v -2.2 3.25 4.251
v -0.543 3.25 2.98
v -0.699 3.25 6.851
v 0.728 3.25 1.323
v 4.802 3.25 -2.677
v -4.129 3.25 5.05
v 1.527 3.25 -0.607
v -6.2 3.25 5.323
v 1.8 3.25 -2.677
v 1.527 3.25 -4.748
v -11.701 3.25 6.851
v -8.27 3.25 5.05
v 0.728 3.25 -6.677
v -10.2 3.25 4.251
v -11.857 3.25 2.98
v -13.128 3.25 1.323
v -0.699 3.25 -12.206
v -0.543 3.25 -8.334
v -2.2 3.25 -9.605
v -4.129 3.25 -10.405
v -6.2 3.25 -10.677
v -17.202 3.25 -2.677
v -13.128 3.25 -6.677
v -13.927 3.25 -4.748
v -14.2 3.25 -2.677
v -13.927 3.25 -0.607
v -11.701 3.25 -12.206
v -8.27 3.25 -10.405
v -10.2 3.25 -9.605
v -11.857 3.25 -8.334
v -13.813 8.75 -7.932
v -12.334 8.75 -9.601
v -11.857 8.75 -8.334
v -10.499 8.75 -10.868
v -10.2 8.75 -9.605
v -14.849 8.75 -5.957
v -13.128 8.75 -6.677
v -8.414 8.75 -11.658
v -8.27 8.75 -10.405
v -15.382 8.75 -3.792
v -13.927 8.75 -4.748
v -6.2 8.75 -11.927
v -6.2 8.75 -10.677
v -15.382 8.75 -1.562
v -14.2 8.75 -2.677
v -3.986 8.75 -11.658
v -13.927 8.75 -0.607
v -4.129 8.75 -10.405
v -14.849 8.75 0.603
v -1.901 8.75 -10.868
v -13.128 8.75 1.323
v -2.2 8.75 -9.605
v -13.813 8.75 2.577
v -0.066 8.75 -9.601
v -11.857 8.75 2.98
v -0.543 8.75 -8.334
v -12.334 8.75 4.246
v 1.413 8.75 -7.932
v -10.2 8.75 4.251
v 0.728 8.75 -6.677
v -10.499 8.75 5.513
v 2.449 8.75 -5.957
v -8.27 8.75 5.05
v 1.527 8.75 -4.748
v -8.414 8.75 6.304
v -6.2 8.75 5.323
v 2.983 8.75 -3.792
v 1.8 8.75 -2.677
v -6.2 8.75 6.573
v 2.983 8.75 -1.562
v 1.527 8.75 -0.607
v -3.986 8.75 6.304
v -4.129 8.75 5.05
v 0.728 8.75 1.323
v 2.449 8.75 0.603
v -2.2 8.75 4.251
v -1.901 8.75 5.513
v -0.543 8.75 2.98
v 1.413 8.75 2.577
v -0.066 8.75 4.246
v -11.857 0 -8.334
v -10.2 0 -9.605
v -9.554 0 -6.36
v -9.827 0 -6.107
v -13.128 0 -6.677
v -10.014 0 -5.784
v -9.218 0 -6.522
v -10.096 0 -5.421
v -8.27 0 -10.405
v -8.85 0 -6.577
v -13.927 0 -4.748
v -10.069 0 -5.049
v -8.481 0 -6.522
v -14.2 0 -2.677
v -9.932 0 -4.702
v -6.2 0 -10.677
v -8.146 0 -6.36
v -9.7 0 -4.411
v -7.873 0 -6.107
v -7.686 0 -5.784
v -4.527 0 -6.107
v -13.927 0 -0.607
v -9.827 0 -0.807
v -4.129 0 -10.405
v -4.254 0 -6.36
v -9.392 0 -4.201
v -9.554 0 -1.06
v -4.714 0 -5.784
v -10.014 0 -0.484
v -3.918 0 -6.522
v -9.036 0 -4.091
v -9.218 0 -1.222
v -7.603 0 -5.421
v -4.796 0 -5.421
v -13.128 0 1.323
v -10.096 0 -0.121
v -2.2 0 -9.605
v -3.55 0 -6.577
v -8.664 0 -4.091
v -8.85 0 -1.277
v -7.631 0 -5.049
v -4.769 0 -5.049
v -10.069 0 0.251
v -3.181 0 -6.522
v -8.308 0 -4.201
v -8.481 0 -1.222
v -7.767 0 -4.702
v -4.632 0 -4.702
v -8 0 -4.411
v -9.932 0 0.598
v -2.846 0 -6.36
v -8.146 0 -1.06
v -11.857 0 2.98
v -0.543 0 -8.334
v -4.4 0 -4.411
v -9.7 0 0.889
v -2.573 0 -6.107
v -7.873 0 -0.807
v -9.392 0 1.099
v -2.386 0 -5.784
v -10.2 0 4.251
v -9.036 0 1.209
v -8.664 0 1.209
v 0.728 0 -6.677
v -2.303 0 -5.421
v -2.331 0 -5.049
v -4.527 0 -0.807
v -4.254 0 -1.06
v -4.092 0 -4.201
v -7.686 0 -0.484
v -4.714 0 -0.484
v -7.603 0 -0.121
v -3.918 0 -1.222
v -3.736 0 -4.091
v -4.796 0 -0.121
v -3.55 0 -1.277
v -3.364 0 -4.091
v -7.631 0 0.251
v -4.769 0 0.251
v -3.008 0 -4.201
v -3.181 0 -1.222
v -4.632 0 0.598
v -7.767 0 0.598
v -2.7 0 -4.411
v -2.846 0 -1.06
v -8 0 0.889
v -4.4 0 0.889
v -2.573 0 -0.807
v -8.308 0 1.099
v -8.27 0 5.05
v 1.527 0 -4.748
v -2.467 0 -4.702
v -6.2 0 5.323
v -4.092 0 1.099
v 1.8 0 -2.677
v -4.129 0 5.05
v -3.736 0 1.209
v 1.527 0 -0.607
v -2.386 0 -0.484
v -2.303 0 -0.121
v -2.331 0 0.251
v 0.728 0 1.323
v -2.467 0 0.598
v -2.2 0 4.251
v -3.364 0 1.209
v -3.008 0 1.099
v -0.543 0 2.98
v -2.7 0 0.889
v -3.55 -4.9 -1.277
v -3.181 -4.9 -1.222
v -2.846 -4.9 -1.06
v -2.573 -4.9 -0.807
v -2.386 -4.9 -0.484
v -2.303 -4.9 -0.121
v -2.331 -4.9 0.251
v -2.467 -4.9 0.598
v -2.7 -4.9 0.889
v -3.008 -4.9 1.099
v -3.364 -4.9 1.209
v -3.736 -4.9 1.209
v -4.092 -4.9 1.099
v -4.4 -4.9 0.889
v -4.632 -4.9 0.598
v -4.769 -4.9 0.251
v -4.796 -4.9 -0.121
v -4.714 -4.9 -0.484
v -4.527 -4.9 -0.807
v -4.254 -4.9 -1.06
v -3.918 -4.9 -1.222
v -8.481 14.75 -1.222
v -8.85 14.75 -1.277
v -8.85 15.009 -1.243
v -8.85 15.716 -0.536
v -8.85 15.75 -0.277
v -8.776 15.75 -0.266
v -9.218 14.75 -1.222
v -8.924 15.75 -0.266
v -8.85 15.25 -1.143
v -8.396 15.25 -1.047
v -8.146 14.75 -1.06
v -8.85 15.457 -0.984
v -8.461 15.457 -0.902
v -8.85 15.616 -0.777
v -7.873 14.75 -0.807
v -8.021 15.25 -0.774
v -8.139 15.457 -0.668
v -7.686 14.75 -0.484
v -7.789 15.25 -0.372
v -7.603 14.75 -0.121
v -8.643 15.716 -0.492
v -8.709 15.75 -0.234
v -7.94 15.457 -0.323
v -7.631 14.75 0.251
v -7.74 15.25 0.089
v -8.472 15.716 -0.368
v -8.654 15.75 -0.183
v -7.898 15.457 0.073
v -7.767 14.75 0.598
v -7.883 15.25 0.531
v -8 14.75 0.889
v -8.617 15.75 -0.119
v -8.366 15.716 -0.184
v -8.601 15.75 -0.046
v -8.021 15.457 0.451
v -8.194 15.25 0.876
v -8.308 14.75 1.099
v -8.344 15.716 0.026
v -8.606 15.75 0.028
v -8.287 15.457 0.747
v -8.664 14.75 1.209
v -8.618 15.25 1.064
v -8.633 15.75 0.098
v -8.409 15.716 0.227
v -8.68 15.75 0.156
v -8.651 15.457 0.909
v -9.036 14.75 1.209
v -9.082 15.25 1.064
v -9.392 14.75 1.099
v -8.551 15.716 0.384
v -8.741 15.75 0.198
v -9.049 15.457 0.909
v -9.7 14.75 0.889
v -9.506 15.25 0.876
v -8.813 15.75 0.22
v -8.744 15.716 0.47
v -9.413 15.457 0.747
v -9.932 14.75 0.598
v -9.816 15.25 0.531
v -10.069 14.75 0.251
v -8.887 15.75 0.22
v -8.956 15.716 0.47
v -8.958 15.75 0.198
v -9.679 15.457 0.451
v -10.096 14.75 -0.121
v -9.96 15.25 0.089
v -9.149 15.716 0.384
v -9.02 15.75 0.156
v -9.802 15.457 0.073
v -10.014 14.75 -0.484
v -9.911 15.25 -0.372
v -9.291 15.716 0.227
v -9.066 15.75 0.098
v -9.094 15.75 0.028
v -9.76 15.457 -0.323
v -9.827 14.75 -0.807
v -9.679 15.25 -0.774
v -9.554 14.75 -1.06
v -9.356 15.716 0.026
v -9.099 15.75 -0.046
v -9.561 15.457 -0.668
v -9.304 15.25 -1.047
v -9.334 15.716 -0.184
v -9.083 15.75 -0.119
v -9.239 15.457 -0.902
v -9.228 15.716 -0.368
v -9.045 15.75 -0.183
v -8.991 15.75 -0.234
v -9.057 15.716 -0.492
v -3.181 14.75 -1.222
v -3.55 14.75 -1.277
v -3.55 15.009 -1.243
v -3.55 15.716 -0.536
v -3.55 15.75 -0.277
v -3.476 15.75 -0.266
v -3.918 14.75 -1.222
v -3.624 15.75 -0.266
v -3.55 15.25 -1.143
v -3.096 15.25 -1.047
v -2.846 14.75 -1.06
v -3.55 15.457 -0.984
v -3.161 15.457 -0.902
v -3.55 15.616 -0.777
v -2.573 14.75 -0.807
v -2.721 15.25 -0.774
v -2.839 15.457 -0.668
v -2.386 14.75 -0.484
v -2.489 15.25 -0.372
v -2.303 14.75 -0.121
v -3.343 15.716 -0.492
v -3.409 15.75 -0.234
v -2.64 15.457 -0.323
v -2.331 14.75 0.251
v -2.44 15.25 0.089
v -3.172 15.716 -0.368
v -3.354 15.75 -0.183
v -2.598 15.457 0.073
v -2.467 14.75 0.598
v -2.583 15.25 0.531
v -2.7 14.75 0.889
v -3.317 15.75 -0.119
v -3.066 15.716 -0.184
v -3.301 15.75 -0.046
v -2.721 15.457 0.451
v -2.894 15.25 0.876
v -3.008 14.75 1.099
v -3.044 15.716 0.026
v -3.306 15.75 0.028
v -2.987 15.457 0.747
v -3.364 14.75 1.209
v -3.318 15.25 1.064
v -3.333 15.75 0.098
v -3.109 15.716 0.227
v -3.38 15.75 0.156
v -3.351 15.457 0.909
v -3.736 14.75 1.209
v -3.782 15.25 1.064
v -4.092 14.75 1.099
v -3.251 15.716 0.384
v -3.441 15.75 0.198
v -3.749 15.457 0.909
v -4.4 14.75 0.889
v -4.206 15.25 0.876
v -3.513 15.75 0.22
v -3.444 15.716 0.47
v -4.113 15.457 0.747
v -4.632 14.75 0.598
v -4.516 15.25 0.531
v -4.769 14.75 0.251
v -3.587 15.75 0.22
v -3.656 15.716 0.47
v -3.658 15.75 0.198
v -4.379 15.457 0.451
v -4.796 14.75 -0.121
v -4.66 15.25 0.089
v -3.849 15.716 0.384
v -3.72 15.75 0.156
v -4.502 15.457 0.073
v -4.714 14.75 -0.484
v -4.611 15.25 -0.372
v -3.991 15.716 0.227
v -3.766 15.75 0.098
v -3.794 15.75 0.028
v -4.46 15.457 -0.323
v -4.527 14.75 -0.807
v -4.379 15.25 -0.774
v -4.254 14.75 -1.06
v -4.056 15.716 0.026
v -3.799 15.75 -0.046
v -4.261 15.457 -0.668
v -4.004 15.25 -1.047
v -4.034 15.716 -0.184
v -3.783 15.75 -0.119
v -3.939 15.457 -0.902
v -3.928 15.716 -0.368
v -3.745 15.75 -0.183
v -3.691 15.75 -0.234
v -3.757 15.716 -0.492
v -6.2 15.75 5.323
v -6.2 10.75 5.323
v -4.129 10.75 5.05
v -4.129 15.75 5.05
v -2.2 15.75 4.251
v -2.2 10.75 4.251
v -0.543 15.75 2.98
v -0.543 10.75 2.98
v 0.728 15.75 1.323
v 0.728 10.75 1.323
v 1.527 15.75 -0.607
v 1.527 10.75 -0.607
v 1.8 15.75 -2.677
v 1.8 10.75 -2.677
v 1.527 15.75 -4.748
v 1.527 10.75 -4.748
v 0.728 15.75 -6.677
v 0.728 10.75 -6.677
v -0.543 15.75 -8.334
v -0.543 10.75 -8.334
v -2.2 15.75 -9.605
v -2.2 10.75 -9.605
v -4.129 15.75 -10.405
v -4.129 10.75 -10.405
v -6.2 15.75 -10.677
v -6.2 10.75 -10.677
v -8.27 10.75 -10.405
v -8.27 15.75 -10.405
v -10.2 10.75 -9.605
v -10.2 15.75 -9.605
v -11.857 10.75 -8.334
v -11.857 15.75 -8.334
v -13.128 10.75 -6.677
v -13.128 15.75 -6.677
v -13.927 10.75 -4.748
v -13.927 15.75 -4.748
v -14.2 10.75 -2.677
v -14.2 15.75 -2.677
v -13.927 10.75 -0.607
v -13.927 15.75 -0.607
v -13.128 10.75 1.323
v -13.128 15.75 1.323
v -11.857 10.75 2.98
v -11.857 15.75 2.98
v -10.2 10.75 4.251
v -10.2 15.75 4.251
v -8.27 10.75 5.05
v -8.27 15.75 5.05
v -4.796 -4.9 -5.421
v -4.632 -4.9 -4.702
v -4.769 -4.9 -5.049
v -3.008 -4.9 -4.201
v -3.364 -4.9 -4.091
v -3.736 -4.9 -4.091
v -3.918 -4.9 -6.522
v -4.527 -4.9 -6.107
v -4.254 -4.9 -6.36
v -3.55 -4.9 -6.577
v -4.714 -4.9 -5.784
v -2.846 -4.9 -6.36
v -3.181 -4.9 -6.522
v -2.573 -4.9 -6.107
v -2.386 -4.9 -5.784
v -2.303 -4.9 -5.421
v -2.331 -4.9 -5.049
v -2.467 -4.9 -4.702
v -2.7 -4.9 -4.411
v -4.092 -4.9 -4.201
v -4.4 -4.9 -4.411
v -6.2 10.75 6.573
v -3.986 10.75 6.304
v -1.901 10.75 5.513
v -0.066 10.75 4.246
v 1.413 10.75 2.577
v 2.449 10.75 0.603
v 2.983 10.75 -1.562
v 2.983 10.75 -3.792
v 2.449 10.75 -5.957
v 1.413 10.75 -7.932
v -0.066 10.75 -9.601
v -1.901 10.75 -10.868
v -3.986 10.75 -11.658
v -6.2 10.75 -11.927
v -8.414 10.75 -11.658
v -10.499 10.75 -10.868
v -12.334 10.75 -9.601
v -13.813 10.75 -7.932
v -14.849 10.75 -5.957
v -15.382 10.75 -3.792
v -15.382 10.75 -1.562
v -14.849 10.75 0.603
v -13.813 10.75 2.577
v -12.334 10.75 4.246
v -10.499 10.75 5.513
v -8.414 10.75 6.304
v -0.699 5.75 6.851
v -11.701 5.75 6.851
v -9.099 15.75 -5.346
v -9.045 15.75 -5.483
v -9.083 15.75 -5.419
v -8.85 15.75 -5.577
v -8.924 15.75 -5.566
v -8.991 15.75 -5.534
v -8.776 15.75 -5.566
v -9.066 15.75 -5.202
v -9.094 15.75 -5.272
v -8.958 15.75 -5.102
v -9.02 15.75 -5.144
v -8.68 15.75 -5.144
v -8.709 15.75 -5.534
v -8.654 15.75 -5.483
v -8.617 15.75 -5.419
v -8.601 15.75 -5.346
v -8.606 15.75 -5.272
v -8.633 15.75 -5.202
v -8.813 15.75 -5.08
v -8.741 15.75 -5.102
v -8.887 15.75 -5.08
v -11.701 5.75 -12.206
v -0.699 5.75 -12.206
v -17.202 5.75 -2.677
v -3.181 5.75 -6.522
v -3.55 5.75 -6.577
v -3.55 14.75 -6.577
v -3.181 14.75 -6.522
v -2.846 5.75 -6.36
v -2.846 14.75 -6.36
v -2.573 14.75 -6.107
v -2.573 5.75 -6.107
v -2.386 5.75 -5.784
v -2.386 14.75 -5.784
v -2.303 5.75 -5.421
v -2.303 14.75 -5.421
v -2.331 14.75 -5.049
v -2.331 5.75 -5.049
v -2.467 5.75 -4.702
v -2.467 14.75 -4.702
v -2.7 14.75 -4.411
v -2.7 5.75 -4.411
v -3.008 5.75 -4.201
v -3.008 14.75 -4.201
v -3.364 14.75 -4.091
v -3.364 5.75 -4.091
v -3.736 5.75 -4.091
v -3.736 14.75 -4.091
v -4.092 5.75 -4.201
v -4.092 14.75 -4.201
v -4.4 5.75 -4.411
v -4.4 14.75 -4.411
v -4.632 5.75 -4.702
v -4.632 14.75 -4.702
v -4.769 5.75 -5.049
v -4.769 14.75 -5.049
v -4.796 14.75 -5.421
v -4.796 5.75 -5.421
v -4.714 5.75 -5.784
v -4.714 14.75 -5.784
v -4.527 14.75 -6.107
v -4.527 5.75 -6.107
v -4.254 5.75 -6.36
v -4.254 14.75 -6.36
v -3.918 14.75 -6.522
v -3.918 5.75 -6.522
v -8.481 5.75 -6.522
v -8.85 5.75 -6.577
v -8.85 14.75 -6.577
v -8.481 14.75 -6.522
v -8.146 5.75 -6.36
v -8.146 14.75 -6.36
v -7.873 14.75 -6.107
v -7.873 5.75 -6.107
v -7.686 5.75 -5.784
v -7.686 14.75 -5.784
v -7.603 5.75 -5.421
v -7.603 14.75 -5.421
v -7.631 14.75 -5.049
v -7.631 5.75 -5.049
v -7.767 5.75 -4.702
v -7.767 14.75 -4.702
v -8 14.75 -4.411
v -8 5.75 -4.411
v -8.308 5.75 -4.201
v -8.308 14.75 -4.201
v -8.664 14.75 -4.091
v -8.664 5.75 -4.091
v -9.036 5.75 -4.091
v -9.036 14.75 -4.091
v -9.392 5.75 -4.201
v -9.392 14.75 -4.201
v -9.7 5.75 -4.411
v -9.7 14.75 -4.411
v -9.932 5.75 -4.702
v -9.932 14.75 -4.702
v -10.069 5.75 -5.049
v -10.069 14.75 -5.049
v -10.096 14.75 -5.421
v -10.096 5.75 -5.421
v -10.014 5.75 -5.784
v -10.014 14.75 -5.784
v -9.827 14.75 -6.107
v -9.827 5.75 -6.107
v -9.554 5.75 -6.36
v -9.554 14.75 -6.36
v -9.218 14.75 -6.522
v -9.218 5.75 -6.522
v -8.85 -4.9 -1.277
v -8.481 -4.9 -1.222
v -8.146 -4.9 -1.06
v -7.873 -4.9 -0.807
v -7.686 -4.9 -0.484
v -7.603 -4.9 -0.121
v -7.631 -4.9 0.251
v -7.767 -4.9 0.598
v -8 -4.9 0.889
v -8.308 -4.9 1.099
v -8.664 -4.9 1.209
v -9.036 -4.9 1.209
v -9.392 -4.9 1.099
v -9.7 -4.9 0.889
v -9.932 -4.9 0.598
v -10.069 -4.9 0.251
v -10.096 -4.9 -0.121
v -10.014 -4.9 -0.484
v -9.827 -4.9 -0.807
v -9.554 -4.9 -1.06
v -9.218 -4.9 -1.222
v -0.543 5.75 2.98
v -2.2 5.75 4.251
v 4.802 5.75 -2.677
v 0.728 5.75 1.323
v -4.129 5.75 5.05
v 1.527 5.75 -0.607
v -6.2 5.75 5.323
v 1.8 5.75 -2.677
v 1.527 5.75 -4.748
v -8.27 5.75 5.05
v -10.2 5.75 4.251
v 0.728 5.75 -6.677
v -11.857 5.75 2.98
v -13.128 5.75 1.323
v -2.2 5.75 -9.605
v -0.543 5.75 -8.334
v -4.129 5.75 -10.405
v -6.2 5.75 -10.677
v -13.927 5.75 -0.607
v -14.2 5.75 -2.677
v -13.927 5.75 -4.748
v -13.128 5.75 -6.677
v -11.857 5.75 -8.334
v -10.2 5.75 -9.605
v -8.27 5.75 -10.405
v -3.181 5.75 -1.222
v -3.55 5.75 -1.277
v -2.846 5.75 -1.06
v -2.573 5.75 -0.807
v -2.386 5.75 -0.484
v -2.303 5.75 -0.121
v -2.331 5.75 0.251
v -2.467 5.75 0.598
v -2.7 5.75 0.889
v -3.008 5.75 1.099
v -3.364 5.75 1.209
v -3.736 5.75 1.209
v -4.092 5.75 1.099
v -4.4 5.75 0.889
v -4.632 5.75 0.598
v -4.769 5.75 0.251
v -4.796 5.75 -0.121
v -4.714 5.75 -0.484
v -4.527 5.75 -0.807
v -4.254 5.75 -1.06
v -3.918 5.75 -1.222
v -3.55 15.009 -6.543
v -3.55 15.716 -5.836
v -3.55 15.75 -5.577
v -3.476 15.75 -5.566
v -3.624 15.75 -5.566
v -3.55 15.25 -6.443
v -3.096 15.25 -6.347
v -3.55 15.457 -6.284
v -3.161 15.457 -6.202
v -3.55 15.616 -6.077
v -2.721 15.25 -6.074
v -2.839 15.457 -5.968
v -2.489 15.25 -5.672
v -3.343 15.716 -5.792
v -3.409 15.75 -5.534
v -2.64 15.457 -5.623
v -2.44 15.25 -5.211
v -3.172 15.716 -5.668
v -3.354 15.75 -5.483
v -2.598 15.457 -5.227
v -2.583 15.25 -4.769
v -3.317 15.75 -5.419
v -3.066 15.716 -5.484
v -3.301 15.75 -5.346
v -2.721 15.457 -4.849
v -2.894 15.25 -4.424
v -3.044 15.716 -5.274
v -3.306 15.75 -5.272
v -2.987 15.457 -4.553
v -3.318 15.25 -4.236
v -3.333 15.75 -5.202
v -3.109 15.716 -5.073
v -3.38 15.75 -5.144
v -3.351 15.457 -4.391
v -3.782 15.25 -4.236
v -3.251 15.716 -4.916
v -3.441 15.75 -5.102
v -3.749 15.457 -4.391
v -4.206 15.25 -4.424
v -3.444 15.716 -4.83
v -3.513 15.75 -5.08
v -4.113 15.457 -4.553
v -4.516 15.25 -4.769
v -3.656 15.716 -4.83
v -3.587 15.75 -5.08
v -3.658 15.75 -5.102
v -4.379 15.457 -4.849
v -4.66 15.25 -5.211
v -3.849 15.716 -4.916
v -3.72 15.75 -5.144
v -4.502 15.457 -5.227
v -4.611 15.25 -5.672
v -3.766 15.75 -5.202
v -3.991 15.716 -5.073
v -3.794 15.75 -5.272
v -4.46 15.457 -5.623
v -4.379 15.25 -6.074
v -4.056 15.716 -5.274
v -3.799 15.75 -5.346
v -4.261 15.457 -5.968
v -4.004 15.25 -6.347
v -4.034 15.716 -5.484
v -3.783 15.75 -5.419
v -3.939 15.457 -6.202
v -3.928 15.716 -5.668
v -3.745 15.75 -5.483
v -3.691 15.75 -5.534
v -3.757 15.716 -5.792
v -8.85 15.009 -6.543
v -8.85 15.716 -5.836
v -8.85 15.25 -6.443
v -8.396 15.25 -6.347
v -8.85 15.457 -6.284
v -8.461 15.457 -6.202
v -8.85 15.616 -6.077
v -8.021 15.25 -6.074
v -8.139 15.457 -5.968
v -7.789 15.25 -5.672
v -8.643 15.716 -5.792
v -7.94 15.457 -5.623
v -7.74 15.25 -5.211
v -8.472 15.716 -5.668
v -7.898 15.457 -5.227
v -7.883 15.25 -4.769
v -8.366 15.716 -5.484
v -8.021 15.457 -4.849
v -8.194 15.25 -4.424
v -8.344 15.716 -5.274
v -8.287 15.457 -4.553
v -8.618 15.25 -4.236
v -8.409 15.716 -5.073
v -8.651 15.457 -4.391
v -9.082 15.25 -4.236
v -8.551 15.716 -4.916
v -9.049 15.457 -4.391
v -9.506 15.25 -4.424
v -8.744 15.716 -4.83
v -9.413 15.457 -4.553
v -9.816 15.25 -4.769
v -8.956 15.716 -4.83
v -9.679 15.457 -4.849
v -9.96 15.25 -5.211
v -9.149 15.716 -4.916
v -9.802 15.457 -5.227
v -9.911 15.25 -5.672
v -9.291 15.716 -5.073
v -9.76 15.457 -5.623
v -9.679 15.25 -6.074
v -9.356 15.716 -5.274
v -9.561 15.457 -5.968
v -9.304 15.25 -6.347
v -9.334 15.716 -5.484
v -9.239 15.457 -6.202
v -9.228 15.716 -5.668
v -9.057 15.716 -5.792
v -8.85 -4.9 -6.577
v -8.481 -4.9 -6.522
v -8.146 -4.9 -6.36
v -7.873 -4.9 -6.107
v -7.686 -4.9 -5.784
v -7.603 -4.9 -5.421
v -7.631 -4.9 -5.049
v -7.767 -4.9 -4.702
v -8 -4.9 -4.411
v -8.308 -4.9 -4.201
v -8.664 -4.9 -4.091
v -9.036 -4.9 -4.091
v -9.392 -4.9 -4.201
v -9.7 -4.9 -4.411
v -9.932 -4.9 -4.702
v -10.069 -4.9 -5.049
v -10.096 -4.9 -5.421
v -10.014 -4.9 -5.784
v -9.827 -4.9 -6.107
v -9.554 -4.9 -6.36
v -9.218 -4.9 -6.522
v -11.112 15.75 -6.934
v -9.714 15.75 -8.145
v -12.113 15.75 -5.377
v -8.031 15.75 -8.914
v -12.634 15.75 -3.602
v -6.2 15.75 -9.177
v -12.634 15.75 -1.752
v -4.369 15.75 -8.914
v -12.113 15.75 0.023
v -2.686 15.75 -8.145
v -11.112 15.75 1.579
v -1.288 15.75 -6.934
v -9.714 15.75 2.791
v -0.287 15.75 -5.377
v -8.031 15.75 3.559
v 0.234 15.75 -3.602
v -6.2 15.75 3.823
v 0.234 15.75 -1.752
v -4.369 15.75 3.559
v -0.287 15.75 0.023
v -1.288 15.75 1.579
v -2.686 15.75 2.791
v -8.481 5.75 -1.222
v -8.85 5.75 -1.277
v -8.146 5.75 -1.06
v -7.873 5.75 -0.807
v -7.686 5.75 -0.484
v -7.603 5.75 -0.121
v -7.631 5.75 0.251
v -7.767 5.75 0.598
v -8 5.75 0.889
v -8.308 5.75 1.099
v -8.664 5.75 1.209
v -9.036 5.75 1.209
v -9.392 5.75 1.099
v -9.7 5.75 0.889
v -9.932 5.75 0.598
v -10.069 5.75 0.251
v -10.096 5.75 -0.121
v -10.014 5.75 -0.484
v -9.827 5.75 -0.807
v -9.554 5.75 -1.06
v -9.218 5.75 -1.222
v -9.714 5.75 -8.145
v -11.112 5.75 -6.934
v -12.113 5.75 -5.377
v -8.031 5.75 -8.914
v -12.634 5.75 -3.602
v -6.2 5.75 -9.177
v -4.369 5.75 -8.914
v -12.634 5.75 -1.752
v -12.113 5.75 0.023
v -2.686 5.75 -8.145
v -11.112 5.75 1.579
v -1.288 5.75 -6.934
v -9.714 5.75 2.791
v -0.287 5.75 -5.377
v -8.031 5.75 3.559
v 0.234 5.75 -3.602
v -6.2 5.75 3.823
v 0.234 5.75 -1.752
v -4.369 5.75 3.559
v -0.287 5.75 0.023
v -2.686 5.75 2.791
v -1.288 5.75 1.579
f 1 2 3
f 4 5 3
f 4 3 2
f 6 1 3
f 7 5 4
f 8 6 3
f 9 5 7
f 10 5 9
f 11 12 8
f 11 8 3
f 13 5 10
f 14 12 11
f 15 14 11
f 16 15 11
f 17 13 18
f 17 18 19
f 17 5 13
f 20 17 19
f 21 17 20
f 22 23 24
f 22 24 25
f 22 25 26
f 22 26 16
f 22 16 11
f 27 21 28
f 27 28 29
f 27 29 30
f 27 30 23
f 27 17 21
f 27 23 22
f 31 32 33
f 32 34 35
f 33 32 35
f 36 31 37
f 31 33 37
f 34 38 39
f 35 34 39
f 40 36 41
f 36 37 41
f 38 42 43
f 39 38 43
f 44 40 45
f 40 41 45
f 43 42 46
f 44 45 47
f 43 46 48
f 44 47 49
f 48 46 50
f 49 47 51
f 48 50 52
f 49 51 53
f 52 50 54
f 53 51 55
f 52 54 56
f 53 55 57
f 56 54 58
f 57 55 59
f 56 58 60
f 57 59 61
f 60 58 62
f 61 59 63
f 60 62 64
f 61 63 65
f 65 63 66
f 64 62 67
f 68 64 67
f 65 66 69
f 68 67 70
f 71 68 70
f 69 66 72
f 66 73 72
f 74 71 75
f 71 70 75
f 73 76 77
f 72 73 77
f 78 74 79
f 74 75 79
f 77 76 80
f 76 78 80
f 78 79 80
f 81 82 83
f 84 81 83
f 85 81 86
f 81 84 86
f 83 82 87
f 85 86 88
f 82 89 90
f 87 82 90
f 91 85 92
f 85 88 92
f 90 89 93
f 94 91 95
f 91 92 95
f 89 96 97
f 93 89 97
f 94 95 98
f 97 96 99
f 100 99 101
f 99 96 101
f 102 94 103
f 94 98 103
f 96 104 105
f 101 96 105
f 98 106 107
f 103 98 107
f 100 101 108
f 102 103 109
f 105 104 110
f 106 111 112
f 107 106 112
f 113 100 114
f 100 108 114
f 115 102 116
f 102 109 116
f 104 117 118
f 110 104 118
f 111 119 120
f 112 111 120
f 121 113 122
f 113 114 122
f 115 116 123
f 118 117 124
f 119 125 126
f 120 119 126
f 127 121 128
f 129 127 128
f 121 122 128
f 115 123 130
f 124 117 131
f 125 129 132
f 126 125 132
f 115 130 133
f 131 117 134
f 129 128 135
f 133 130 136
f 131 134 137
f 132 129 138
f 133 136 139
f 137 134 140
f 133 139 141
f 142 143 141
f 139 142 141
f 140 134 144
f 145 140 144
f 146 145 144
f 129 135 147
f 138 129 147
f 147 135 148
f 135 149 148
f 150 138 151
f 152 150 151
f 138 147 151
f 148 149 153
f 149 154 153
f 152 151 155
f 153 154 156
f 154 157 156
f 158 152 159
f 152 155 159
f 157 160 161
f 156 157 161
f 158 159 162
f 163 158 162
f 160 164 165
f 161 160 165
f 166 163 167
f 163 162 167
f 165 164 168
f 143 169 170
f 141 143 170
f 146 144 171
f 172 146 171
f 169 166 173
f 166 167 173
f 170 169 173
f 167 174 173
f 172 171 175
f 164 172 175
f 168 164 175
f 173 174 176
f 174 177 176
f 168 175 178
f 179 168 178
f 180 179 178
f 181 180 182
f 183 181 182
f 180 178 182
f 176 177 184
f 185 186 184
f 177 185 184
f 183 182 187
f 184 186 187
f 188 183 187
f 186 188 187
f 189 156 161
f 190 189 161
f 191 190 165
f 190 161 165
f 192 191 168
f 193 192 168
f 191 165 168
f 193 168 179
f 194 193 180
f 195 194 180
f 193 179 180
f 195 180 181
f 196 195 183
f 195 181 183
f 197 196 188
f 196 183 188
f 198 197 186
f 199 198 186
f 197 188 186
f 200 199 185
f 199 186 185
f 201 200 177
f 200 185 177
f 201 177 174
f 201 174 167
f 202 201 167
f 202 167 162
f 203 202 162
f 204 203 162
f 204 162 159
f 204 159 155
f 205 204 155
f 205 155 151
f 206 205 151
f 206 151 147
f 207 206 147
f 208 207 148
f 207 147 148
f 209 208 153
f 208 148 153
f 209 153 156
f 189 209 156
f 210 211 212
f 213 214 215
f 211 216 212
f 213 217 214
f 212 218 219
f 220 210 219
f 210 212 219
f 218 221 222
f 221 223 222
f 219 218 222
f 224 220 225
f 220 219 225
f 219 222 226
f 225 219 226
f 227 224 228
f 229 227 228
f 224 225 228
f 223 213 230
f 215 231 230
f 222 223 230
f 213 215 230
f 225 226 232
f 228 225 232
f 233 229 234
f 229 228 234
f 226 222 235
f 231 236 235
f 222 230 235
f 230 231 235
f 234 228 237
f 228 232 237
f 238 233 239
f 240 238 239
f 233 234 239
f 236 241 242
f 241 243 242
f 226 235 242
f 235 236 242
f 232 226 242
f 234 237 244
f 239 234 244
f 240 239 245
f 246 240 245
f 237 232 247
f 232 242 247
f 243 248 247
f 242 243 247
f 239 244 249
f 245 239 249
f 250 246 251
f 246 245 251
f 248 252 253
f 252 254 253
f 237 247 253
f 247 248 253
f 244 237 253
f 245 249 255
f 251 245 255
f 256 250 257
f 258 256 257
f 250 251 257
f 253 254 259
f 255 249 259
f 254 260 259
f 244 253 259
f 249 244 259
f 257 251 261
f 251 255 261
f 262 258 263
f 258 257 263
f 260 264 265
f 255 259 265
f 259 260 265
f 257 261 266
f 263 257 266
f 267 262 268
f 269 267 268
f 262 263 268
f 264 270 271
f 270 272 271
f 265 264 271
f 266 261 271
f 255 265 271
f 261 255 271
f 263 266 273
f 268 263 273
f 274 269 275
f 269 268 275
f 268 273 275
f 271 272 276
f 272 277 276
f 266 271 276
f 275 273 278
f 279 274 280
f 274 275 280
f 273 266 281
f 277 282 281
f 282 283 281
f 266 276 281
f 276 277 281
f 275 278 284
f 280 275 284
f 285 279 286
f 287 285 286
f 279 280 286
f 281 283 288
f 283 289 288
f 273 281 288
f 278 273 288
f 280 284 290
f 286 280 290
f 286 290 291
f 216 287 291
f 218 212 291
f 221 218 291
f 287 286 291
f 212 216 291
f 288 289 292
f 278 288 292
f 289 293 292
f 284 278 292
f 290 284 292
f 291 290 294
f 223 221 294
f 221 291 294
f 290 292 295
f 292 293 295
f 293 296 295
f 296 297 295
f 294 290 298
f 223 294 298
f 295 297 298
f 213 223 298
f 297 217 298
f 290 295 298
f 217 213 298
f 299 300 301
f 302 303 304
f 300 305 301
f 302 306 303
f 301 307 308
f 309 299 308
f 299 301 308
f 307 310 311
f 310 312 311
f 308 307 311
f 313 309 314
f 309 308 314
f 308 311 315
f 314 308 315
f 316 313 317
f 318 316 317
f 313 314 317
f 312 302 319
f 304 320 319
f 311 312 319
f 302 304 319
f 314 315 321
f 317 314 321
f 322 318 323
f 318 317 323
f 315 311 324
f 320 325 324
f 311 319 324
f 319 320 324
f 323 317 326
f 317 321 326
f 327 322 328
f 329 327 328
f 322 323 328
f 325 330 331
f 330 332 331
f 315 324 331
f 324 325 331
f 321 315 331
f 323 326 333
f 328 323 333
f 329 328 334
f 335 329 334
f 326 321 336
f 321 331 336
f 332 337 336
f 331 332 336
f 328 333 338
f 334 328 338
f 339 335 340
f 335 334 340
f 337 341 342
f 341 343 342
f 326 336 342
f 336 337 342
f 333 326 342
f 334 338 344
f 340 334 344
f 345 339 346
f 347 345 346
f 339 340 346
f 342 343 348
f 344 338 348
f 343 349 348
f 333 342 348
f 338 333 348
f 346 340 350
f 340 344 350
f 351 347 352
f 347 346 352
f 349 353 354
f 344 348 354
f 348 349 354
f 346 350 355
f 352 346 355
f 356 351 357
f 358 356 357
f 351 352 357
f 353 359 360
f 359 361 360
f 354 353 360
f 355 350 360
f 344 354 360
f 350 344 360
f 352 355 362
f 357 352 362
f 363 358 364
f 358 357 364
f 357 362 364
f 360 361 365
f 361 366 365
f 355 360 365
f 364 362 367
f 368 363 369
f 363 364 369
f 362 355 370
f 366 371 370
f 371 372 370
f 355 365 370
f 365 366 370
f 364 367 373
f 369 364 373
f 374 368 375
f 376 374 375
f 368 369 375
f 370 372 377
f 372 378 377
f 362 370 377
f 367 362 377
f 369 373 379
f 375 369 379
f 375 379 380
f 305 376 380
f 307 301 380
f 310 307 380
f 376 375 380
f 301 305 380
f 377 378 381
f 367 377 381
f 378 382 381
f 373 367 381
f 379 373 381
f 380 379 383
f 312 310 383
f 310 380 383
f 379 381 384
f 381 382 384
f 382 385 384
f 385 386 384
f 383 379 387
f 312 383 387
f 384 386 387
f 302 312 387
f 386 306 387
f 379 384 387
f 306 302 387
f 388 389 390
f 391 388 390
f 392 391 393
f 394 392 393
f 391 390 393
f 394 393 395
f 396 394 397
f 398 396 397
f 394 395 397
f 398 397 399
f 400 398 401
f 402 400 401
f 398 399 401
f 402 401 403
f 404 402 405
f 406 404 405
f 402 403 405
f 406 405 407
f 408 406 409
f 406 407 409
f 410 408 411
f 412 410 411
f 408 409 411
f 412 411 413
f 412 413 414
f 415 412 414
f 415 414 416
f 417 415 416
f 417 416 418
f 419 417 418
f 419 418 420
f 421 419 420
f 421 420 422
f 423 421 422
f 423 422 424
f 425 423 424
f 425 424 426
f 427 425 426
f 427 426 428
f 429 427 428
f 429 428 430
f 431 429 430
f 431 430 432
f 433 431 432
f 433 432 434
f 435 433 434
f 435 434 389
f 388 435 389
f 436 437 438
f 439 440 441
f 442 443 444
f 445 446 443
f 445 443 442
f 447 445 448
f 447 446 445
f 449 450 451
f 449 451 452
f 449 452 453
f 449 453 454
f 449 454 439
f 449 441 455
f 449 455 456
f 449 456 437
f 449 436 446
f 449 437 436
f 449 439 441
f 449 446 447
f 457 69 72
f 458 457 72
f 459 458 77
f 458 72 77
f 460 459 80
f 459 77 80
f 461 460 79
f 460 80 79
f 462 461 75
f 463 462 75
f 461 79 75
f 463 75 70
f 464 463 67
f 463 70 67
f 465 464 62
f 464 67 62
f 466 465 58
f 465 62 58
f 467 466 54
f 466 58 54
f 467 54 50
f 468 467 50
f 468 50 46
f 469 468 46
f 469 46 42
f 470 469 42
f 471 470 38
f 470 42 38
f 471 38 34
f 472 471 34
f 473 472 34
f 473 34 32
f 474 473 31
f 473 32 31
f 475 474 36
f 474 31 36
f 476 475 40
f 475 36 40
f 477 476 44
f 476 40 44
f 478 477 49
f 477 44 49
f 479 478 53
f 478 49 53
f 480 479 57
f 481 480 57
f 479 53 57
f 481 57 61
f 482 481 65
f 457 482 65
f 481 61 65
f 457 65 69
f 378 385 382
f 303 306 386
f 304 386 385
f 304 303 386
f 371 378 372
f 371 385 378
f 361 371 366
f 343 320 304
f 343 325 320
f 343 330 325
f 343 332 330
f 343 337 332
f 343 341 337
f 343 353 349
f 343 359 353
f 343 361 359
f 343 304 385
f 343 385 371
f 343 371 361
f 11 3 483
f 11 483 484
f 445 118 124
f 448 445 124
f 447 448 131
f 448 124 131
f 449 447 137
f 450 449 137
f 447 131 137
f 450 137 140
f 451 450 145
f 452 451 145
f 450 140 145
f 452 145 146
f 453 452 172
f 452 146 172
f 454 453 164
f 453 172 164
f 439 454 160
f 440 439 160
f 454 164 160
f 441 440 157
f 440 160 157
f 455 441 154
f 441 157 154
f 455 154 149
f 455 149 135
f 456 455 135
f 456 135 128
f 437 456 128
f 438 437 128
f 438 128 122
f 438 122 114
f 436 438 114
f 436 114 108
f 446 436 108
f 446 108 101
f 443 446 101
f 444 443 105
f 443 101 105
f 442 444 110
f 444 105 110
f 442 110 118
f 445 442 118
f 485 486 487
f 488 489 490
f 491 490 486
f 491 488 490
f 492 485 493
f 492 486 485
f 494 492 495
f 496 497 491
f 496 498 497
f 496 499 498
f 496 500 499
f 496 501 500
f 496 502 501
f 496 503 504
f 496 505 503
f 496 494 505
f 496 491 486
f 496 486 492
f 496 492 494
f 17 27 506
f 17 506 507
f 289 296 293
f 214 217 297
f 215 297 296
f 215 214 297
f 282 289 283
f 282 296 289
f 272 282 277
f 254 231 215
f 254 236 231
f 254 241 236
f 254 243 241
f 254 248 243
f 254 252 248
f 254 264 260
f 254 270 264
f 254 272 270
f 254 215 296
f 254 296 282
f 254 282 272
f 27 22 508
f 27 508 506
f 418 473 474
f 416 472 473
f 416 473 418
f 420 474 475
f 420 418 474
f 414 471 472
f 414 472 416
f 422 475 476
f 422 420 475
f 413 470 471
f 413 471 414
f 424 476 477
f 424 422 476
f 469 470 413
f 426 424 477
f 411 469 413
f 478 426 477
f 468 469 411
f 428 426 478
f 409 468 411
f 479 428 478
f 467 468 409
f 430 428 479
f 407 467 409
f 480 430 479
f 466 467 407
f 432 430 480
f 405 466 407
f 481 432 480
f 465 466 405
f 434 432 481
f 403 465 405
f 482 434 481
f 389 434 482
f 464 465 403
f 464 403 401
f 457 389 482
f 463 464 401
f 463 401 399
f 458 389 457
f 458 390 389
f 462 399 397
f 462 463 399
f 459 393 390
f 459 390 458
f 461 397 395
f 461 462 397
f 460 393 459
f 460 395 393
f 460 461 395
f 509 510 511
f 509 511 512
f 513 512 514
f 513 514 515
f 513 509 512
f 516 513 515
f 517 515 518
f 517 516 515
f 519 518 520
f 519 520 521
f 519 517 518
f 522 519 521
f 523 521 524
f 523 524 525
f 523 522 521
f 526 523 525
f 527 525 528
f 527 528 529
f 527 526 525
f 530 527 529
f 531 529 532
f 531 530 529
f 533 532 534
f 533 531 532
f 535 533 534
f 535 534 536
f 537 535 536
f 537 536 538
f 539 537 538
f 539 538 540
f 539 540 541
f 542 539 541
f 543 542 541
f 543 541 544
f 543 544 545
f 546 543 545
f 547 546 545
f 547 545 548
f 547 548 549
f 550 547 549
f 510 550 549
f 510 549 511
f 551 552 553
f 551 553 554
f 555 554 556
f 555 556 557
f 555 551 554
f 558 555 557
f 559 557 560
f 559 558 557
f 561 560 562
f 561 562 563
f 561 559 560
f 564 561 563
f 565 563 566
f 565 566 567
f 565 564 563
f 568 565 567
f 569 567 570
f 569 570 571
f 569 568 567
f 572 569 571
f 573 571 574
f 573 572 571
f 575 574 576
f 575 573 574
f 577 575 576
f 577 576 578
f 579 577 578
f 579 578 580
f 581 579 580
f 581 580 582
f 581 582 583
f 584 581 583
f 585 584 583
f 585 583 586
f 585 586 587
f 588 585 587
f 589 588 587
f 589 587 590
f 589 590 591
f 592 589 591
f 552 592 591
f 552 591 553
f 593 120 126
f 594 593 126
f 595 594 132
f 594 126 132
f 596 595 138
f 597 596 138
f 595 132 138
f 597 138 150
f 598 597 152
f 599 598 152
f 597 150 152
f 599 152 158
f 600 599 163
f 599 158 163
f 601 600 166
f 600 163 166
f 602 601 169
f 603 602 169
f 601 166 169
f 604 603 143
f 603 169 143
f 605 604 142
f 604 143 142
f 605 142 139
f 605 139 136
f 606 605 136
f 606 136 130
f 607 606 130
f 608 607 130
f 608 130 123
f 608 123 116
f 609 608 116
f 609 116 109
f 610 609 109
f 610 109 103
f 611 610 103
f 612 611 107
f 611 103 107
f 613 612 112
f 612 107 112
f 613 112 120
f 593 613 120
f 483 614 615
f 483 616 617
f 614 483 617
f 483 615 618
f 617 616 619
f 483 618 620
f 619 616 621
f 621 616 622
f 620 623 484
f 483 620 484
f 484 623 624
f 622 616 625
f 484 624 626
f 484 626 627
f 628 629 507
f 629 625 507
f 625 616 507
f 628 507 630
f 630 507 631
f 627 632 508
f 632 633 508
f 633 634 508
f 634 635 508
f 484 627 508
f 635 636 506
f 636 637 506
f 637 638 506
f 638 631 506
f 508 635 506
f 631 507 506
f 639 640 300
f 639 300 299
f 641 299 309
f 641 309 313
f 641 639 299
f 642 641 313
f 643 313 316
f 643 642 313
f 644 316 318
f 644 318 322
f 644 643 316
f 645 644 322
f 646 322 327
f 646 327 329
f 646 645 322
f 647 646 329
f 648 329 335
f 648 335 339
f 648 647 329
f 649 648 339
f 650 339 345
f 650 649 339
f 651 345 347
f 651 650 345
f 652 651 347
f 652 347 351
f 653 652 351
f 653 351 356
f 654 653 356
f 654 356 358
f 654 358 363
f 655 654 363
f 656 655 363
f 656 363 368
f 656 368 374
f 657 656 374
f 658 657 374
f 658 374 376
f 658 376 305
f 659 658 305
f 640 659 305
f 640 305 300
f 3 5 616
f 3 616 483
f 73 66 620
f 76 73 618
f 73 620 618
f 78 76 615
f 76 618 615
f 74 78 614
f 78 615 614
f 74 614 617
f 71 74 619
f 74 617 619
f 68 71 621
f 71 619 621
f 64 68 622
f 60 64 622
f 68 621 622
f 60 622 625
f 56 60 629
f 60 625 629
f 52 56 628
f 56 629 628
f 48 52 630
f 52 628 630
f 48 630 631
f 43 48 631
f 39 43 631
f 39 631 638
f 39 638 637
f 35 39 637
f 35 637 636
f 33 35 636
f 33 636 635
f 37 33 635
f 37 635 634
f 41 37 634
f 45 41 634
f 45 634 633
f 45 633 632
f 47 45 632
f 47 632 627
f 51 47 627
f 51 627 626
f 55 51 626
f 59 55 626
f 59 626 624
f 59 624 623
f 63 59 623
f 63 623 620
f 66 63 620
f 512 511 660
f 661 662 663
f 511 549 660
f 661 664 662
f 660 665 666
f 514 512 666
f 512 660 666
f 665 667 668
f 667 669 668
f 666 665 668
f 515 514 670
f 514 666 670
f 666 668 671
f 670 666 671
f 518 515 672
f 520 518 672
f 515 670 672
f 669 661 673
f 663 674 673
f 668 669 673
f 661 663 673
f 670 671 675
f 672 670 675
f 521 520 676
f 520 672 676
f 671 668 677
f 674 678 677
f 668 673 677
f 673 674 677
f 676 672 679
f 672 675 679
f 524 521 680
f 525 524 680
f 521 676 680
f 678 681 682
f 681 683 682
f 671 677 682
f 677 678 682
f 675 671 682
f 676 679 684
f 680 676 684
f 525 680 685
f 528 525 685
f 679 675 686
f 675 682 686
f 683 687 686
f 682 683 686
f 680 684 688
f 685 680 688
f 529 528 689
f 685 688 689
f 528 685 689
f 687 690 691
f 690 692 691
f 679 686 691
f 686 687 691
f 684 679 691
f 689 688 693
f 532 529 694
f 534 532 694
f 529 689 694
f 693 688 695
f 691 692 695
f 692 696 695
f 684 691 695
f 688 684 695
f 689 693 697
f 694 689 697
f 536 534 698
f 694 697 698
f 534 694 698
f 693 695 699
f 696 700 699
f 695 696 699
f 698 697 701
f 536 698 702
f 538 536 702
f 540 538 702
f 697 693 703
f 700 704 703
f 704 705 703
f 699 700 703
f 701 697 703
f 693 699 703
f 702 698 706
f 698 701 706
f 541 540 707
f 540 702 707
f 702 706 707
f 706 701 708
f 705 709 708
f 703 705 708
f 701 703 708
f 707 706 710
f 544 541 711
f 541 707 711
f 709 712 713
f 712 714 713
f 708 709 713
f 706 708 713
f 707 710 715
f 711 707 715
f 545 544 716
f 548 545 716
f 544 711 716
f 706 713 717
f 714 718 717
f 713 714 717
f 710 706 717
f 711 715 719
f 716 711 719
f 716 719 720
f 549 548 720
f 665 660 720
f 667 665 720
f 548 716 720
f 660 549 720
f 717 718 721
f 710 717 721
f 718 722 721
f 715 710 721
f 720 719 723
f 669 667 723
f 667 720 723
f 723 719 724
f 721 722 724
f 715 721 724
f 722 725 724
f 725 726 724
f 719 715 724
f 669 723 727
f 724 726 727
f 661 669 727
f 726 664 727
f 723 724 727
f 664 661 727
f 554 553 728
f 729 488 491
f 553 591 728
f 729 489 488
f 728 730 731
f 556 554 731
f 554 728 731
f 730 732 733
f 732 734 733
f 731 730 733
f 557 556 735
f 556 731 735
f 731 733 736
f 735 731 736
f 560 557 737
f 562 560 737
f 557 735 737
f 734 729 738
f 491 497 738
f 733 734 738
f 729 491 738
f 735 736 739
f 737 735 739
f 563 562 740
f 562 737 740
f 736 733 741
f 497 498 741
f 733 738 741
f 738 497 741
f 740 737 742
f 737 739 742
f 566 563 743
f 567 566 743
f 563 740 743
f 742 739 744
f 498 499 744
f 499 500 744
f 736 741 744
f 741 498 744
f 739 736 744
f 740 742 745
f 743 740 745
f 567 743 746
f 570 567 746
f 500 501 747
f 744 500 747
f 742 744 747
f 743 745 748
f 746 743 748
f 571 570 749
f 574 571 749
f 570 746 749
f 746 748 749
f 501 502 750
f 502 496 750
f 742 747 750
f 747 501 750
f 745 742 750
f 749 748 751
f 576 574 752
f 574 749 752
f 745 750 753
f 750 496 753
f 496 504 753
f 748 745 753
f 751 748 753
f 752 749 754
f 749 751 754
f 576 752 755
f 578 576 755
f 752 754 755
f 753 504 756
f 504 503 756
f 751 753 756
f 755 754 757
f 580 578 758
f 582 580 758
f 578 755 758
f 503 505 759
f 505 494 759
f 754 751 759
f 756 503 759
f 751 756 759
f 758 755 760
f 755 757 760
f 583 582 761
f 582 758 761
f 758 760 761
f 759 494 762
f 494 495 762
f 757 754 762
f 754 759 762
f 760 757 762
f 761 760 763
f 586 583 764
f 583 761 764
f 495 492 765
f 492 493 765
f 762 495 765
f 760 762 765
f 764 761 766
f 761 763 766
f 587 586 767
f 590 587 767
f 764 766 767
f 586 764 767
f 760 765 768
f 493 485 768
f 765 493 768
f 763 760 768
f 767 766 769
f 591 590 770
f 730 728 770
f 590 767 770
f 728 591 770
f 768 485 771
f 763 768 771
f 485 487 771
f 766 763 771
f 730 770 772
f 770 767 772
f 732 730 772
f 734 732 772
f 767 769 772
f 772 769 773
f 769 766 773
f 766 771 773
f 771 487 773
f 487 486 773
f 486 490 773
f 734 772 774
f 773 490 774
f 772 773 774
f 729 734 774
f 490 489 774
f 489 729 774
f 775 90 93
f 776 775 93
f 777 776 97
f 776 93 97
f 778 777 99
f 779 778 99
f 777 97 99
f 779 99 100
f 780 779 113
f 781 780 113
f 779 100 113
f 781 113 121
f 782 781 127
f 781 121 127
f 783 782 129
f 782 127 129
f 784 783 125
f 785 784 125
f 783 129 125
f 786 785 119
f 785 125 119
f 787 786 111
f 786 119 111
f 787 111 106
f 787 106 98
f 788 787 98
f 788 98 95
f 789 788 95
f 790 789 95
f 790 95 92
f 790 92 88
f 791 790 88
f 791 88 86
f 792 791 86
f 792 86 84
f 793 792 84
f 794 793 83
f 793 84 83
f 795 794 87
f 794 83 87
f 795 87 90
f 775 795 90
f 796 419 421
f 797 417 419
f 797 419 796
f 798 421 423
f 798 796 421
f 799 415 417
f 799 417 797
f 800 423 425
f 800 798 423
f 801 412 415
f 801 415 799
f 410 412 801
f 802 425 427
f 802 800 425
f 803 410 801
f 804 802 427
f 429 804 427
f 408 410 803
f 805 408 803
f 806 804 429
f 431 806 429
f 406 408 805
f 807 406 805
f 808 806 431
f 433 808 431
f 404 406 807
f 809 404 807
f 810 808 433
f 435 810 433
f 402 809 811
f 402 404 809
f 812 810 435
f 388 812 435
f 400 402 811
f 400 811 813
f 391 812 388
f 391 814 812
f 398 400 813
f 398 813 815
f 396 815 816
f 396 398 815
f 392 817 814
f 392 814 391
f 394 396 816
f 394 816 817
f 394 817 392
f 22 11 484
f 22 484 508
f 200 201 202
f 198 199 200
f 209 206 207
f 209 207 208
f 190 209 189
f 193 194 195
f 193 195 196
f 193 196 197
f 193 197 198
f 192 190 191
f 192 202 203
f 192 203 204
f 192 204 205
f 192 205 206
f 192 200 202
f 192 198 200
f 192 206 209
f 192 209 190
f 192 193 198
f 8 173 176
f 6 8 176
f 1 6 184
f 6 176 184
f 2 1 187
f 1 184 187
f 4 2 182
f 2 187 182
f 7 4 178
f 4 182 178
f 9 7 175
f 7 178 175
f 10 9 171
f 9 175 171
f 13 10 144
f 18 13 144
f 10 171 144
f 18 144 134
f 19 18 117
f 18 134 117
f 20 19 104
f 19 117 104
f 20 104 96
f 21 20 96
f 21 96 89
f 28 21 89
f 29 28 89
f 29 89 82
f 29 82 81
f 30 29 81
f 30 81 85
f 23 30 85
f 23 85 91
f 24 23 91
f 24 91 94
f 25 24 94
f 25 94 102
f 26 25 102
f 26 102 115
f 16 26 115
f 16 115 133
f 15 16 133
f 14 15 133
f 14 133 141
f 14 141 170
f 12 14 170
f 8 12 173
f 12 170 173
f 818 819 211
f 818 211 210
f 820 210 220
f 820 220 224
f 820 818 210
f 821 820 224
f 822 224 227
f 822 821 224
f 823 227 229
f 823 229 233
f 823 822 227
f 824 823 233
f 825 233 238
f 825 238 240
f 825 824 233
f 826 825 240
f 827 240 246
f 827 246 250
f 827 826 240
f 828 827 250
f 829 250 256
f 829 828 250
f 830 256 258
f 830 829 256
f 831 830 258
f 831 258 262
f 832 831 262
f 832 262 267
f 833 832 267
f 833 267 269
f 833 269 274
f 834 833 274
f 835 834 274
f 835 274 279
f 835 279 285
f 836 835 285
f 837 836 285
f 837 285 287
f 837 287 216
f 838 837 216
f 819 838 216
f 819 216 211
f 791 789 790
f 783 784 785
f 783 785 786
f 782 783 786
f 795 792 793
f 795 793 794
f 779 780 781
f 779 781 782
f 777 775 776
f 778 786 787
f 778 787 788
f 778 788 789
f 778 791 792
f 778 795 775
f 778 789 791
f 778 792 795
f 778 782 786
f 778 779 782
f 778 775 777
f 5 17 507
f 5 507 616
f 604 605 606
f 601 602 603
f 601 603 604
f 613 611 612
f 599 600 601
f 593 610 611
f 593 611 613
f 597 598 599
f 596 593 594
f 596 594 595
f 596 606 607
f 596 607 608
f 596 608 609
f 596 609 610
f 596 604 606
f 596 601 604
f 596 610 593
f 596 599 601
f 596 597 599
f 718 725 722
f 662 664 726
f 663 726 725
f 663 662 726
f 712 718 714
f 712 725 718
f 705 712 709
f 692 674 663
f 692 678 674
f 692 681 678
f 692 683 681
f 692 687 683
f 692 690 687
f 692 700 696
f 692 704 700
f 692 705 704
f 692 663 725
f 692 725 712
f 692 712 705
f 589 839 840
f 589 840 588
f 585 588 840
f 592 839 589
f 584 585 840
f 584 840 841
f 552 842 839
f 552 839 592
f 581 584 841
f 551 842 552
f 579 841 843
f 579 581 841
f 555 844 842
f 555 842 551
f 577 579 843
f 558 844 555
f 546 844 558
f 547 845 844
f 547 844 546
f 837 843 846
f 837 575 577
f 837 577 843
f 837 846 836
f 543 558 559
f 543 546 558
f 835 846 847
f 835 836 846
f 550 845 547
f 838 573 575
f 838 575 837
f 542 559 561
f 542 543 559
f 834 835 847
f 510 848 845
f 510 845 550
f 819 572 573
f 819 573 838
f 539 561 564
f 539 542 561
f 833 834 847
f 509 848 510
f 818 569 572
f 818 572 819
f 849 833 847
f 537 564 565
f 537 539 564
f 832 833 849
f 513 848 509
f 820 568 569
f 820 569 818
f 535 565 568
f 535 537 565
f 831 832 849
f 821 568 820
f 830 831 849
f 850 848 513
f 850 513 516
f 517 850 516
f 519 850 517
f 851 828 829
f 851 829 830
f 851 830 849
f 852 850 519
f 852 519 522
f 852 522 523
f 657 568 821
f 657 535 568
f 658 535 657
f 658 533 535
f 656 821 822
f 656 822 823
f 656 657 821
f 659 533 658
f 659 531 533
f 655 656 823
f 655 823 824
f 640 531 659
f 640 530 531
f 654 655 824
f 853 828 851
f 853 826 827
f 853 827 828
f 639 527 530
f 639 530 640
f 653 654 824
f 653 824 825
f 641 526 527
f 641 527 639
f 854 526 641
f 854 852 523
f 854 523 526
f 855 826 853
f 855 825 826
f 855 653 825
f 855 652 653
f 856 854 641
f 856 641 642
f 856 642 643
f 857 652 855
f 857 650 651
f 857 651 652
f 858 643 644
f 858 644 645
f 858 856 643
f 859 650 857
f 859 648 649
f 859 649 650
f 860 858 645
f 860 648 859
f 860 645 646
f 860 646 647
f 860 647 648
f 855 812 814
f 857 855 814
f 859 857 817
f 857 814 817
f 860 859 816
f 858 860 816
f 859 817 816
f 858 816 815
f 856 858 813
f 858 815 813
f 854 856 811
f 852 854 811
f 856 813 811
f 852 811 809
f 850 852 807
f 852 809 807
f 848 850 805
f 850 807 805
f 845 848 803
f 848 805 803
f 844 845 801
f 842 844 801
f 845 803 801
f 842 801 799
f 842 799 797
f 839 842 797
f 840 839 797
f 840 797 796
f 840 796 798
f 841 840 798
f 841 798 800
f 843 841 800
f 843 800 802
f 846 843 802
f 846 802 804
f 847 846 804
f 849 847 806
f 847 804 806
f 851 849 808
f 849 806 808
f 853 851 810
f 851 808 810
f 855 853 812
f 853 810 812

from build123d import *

# Parameters (mm, degrees)
SZKIC1_R                                = 8
DODANIE_WYCI_GNI_CIE1_DEPTH             = 15.75
SZKIC2_R                                = 6.5
WYTNIJ_WYCI_GNI_CIE1_DEPTH              = 10
DODANIE_WYCI_GNI_CIE2_START             = -2
SZKIC4_R                                = 9.25
SZKIC4_R_2                              = 8
DODANIE_WYCI_GNI_CIE2_DEPTH             = 2
SZKIC5_R                                = 1.25
DODANIE_WYCI_GNI_CIE3_DEPTH             = 4.9
DODANIE_WYCI_GNI_CIE3_DIRECTION_2_REACH = 27.08
ZAOKR_GLENIE1_R                         = 1
DODANIE_WYCI_GNI_CIE4_START             = 2.5
SZKIC6_R                                = 8
DODANIE_WYCI_GNI_CIE4_DEPTH             = 2.5


with BuildPart() as part:
    # Szkic1 → Dodanie-wyciągnięcie1 (new body)
    with BuildSketch(Plane(origin=(0, 0, 0), x_dir=(1, 0, 0), z_dir=(0, 1, 0))):
        with Locations(Location((-6.199930539, 2.677242733, 0), (0, 0, 270))):
            Circle(SZKIC1_R)
    extrude(amount=DODANIE_WYCI_GNI_CIE1_DEPTH)

    # Szkic2 → Wytnij-wyciągnięcie1 (cut)
    with BuildSketch(Plane(origin=(0, 15.75, 0), x_dir=(1, 0, 0), z_dir=(0, 1, 0))):
        with Locations(Location((-6.199930539, 2.677242733, 0), (0, 0, 270))):
            Circle(SZKIC2_R)
    extrude(amount=-WYTNIJ_WYCI_GNI_CIE1_DEPTH, mode=Mode.SUBTRACT)

    # Szkic4 → Dodanie-wyciągnięcie2 (add)
    with BuildSketch(Plane(origin=(0, 10.75, 0), x_dir=(1, 0, 0), z_dir=(0, 1, 0)).offset(DODANIE_WYCI_GNI_CIE2_START)):
        with Locations(Location((-6.199930539, 2.677242733, 0), (0, 0, 270))):
            Circle(SZKIC4_R)
        with Locations(Location((-6.199930539, 2.677242733, 0), (0, 0, 270))):
            Circle(SZKIC4_R_2, mode=Mode.SUBTRACT)
    extrude(amount=DODANIE_WYCI_GNI_CIE2_DEPTH)

    # Szkic5 → Dodanie-wyciągnięcie3 (add)
    with BuildSketch(Plane.XZ):
        with Locations(Location((-8.849930539, -0.027242733, 0), (0, 0, 270))):
            Circle(SZKIC5_R)
        with Locations(Location((-3.549930539, -0.027242733, 0), (0, 0, 270))):
            Circle(SZKIC5_R)
        with Locations(Location((-3.549930539, -5.327242733, 0), (0, 0, 270))):
            Circle(SZKIC5_R)
        with Locations(Location((-8.849930539, -5.327242733, 0), (0, 0, 270))):
            Circle(SZKIC5_R)
    extrude(amount=DODANIE_WYCI_GNI_CIE3_DEPTH)

    # Dodanie-wyciągnięcie3 direction 2: up to this face of the body (flat: up to its plane)
    dodanie_wyci_gni_cie3_direction_2_end = Plane(part.part.faces().sort_by_distance((-6.199930539, 15.75, -10.450968563))[0])
    # Szkic5 → Dodanie-wyciągnięcie3 direction 2 (add, up to the picked face)
    with BuildSketch(Plane.XZ, mode=Mode.PRIVATE) as dodanie_wyci_gni_cie3_direction_2_sk1:
        with Locations(Location((-8.849930539, -0.027242733, 0), (0, 0, 270))):
            Circle(SZKIC5_R)
    dodanie_wyci_gni_cie3_direction_2_tool1 = split(extrude(dodanie_wyci_gni_cie3_direction_2_sk1.sketch, amount=-DODANIE_WYCI_GNI_CIE3_DIRECTION_2_REACH, mode=Mode.PRIVATE), bisect_by=dodanie_wyci_gni_cie3_direction_2_end, keep=Keep.BOTH, mode=Mode.PRIVATE)
    # Szkic5 → Dodanie-wyciągnięcie3 direction 2 (add, up to the picked face)
    with BuildSketch(Plane.XZ, mode=Mode.PRIVATE) as dodanie_wyci_gni_cie3_direction_2_sk2:
        with Locations(Location((-3.549930539, -0.027242733, 0), (0, 0, 270))):
            Circle(SZKIC5_R)
    dodanie_wyci_gni_cie3_direction_2_tool2 = split(extrude(dodanie_wyci_gni_cie3_direction_2_sk2.sketch, amount=-DODANIE_WYCI_GNI_CIE3_DIRECTION_2_REACH, mode=Mode.PRIVATE), bisect_by=dodanie_wyci_gni_cie3_direction_2_end, keep=Keep.BOTH, mode=Mode.PRIVATE)
    # Szkic5 → Dodanie-wyciągnięcie3 direction 2 (add, up to the picked face)
    with BuildSketch(Plane.XZ, mode=Mode.PRIVATE) as dodanie_wyci_gni_cie3_direction_2_sk3:
        with Locations(Location((-3.549930539, -5.327242733, 0), (0, 0, 270))):
            Circle(SZKIC5_R)
    dodanie_wyci_gni_cie3_direction_2_tool3 = split(extrude(dodanie_wyci_gni_cie3_direction_2_sk3.sketch, amount=-DODANIE_WYCI_GNI_CIE3_DIRECTION_2_REACH, mode=Mode.PRIVATE), bisect_by=dodanie_wyci_gni_cie3_direction_2_end, keep=Keep.BOTH, mode=Mode.PRIVATE)
    # Szkic5 → Dodanie-wyciągnięcie3 direction 2 (add, up to the picked face)
    with BuildSketch(Plane.XZ, mode=Mode.PRIVATE) as dodanie_wyci_gni_cie3_direction_2_sk4:
        with Locations(Location((-8.849930539, -5.327242733, 0), (0, 0, 270))):
            Circle(SZKIC5_R)
    dodanie_wyci_gni_cie3_direction_2_tool4 = split(extrude(dodanie_wyci_gni_cie3_direction_2_sk4.sketch, amount=-DODANIE_WYCI_GNI_CIE3_DIRECTION_2_REACH, mode=Mode.PRIVATE), bisect_by=dodanie_wyci_gni_cie3_direction_2_end, keep=Keep.BOTH, mode=Mode.PRIVATE)
    add(dodanie_wyci_gni_cie3_direction_2_tool1.solids().sort_by(Axis((-8.849931, 0, -0.027243), (0, 1, 0)))[0])
    add(dodanie_wyci_gni_cie3_direction_2_tool2.solids().sort_by(Axis((-3.549931, 0, -0.027243), (0, 1, 0)))[0])
    add(dodanie_wyci_gni_cie3_direction_2_tool3.solids().sort_by(Axis((-3.549931, 0, -5.327243), (0, 1, 0)))[0])
    add(dodanie_wyci_gni_cie3_direction_2_tool4.solids().sort_by(Axis((-8.849931, 0, -5.327243), (0, 1, 0)))[0])

    # Zaokrąglenie1
    zaokr_glenie1_edges = [part.edges().sort_by_distance(p)[0] for p in [
        (-8.849930539, 15.75, 1.222757267),
        (-3.549930539, 15.75, 1.222757267),
        (-3.549930539, 15.75, -4.077242733),
        (-8.849930539, 15.75, -4.077242733),
    ]]
    fillet(zaokr_glenie1_edges, radius=ZAOKR_GLENIE1_R)

    # Szkic6 → Dodanie-wyciągnięcie4 (add)
    with BuildSketch(Plane(origin=(0, 5.75, 0), x_dir=(-1, 0, 0), z_dir=(0, -1, 0)).offset(DODANIE_WYCI_GNI_CIE4_START)):
        Polygon((17.202288313, 2.677242733), (11.701109426, 12.205564067), (0.698751652, 12.205564067), (-4.802427235, 2.677242733), (0.698751652, -6.851078601), (11.701109426, -6.851078601), align=None)
        with Locations(Location((6.199930539, 2.677242733, 0), (0, 0, 90))):
            Circle(SZKIC6_R, mode=Mode.SUBTRACT)
    extrude(amount=-DODANIE_WYCI_GNI_CIE4_DEPTH)


solid = part.part
